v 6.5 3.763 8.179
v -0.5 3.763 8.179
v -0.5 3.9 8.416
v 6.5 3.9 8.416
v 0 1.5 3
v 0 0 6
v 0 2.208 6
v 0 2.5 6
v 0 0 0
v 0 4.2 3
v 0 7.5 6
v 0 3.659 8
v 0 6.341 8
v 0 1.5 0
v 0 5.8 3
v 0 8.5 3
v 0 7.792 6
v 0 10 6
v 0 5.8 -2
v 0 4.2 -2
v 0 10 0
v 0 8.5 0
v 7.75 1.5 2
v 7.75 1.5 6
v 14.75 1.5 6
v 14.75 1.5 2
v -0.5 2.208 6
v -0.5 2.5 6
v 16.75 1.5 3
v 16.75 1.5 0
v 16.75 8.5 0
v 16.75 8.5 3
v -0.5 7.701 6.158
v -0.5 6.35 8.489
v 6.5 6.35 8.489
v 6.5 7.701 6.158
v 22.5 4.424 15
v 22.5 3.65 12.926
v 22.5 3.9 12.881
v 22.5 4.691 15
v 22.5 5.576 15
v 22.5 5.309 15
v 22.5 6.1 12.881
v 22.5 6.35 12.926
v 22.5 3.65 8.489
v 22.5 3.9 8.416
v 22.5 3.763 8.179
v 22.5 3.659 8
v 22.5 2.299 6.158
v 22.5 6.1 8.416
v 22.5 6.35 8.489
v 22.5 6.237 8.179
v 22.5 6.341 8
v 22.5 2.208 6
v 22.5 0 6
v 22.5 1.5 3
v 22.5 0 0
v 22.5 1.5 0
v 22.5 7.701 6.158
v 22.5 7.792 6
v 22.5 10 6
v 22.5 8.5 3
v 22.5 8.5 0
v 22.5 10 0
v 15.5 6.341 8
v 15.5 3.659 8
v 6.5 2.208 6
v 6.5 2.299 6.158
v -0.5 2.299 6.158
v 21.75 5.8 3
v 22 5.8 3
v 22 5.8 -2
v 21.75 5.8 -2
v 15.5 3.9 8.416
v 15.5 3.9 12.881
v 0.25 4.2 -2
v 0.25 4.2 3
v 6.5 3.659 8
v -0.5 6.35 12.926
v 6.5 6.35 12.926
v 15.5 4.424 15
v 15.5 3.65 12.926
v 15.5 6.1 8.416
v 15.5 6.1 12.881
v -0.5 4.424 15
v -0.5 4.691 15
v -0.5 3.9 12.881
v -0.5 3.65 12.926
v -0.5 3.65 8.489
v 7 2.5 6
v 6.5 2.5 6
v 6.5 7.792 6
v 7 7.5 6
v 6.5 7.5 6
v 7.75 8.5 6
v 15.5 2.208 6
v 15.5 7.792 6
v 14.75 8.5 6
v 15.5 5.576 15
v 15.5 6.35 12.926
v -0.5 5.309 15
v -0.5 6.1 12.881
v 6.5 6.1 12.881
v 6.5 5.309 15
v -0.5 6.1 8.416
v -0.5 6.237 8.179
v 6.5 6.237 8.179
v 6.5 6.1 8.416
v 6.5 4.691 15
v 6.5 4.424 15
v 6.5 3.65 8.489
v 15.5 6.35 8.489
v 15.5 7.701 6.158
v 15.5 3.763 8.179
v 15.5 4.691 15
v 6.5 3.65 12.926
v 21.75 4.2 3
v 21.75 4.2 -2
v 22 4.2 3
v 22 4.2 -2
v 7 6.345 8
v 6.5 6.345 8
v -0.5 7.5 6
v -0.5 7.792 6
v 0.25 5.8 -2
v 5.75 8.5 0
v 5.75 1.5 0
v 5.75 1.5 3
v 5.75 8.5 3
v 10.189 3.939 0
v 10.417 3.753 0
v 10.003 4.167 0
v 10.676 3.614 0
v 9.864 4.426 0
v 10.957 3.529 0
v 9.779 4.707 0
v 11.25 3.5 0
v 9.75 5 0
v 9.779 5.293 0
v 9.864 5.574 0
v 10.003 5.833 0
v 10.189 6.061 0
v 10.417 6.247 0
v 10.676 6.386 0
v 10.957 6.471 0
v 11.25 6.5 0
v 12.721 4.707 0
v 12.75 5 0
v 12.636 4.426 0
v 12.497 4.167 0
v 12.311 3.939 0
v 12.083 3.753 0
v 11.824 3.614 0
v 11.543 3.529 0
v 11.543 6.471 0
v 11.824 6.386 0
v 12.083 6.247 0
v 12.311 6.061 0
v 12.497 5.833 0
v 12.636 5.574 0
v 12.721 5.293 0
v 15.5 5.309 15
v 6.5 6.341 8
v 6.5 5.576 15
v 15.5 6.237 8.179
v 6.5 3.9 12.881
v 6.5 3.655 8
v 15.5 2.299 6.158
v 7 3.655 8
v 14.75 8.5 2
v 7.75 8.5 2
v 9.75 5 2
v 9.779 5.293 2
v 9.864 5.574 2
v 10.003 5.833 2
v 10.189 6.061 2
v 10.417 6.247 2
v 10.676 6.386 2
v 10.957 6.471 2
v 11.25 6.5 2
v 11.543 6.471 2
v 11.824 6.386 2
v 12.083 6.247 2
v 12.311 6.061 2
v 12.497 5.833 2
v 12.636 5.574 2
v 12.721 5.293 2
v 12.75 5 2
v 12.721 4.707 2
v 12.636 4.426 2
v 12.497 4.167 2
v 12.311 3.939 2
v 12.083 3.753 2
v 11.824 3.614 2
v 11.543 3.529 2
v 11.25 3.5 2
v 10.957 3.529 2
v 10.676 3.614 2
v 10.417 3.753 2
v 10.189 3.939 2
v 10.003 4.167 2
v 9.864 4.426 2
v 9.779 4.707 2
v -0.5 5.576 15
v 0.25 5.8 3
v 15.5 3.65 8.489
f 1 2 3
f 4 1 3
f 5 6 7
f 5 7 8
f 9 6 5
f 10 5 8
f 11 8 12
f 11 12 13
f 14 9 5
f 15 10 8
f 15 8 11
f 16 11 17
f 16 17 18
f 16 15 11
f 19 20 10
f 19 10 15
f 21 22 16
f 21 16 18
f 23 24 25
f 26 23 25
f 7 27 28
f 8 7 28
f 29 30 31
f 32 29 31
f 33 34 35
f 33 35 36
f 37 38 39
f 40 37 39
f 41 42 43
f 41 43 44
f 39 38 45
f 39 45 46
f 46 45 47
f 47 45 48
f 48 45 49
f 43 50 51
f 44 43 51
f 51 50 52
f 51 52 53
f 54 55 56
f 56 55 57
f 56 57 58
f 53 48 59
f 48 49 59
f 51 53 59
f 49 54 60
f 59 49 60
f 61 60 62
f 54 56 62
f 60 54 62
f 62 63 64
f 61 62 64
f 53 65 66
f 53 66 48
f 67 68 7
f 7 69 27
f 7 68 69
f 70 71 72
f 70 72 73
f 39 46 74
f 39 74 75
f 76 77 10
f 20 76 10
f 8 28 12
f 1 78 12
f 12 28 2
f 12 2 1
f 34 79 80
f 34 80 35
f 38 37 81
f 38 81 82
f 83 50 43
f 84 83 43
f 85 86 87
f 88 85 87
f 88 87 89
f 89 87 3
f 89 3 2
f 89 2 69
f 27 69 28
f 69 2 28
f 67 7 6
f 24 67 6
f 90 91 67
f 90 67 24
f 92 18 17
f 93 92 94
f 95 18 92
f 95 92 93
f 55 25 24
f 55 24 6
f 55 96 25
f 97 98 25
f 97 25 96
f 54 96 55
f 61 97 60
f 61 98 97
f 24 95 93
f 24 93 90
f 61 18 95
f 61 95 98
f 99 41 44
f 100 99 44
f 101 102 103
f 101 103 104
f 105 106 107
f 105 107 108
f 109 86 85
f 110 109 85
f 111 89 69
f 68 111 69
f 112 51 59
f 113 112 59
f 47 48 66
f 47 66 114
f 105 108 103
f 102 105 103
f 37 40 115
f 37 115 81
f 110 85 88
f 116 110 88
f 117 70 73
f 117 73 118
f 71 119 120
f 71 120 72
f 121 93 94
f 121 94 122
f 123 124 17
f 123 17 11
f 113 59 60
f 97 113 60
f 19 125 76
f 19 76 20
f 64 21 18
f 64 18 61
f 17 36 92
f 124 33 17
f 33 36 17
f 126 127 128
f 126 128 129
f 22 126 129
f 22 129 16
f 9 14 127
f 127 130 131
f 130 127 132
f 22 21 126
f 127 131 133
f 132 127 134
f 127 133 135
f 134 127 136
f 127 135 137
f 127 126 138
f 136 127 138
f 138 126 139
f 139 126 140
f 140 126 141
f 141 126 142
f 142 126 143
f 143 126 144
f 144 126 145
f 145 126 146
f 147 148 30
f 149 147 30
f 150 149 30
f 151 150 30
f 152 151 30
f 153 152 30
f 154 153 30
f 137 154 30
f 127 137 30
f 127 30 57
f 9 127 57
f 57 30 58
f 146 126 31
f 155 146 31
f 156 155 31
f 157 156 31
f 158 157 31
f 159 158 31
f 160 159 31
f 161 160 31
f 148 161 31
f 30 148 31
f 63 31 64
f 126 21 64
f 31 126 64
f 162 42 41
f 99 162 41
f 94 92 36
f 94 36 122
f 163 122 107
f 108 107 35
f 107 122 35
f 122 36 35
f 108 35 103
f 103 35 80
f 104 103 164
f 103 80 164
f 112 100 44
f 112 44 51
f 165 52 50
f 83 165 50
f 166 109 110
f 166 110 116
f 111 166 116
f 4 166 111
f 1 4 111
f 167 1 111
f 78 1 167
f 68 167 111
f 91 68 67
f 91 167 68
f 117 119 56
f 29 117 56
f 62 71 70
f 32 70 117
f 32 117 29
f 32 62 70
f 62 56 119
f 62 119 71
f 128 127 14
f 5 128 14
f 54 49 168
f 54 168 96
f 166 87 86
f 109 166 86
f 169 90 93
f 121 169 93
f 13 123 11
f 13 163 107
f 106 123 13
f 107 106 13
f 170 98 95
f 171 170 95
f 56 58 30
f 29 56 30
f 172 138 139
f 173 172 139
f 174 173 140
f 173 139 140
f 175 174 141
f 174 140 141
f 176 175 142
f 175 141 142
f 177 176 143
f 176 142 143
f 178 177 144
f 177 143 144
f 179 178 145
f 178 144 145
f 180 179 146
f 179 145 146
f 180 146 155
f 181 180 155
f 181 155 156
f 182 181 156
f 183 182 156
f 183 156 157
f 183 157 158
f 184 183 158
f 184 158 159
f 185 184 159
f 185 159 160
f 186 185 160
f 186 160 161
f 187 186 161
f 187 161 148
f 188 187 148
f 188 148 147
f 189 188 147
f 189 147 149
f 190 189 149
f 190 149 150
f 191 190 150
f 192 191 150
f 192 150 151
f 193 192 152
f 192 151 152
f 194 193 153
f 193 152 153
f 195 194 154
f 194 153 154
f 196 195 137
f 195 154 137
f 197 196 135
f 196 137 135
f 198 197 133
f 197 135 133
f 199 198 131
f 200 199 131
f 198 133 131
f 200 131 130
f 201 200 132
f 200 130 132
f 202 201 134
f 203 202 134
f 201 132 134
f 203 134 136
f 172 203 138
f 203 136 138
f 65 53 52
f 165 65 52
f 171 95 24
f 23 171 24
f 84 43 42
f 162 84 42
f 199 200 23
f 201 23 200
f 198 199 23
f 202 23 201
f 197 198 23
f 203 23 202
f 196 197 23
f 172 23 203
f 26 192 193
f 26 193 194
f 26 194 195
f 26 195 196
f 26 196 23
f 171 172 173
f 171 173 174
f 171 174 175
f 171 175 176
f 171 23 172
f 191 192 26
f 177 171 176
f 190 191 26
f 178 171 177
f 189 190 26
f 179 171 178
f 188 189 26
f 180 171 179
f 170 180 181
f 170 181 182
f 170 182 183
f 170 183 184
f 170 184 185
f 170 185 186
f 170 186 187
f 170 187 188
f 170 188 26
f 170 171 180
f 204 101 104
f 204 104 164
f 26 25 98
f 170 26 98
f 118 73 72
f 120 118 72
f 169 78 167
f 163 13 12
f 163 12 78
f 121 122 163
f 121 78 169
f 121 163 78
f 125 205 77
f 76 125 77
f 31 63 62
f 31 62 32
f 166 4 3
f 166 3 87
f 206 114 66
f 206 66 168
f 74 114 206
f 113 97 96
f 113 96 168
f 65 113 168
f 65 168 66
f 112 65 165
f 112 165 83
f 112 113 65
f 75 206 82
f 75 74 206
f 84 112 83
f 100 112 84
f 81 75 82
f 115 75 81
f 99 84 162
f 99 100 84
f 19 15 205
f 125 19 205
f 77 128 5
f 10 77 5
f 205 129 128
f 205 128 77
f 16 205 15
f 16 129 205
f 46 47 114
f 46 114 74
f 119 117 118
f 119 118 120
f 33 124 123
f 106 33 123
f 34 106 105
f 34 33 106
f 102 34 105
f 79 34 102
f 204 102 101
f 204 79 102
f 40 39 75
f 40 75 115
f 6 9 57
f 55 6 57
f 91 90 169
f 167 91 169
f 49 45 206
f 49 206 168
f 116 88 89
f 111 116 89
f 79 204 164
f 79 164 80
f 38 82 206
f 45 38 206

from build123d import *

# Parameters (mm, degrees)
SKETCH_1_W          = 22.5
SKETCH_1_H          = 10
EXTRUDE_1_DEPTH     = 6
SKETCH_2_R          = 1.5
CUT_EXTRUDE_1_DEPTH = 26.342651795
SKETCH_3_W          = 5.75
SKETCH_3_H          = 7
CUT_EXTRUDE_2_DEPTH = 3
CUT_EXTRUDE_3_DEPTH = 4
SKETCH_5_W          = 7
SKETCH_5_H          = 5
EXTRUDE_2_DEPTH     = 2
CUT_EXTRUDE_4_DEPTH = 26.889186932
EXTRUDE_3_DEPTH     = 7
EXTRUDE_4_DEPTH     = 5


with BuildPart() as part:
    # 草图1 → 凸台-拉伸1 (new body)
    with BuildSketch(Plane.XY):
        with Locations((11.25, 5)):
            Rectangle(SKETCH_1_W, SKETCH_1_H)
    extrude(amount=EXTRUDE_1_DEPTH)

    # 草图2 → 切除-拉伸1 (cut, through all)
    with BuildSketch(Plane(origin=(0, 0, 0), x_dir=(-1, 0, 0), z_dir=(0, 0, -1))):
        with Locations((-11.25, 5)):
            Circle(SKETCH_2_R)
    extrude(amount=-CUT_EXTRUDE_1_DEPTH, mode=Mode.SUBTRACT)

    # 草图3 → 切除-拉伸2 (cut)
    with BuildSketch(Plane(origin=(0, 0, 0), x_dir=(-1, 0, 0), z_dir=(0, 0, -1))):
        with Locations((-19.625, 5)):
            Rectangle(SKETCH_3_W, SKETCH_3_H)
        with Locations((-2.875, 5)):
            Rectangle(SKETCH_3_W, SKETCH_3_H)
    extrude(amount=-CUT_EXTRUDE_2_DEPTH, mode=Mode.SUBTRACT)

    # 草图4 → 切除-拉伸3 (cut)
    with BuildSketch(Plane.XY.offset(6)):
        Polygon((14.75, 1.5), (14.75, 8.5), (11.25, 8.5), (7.75, 8.5), (7.75, 1.5), (11.25, 1.5), align=None)
    extrude(amount=-CUT_EXTRUDE_3_DEPTH, mode=Mode.SUBTRACT)

    # 草图5 → 凸台-拉伸2 (add)
    with BuildSketch(Plane.XY.offset(6)):
        with Locations((19, 5)):
            Rectangle(SKETCH_5_W, SKETCH_5_H)
        with Locations((3.5, 5)):
            Rectangle(SKETCH_5_W, SKETCH_5_H)
    extrude(amount=EXTRUDE_2_DEPTH)

    # 草图6 → 切除-拉伸4 (cut, through all)
    with BuildSketch(Plane(origin=(22.5, 0, 0), x_dir=(0, 0, -1), z_dir=(1, 0, 0))):
        Polygon((-6, 7.5), (-8, 6.345299462), (-8, 7.5), align=None)
        Polygon((-8, 3.654700538), (-8, 2.5), (-6, 2.5), align=None)
    extrude(amount=-CUT_EXTRUDE_4_DEPTH, mode=Mode.SUBTRACT)

    # 草图7 → 凸台-拉伸3 (add)
    with BuildSketch(Plane(origin=(22.5, 0, 0), x_dir=(0, 0, -1), z_dir=(1, 0, 0))):
        Polygon((-6, 7.5), (-8.178644615, 6.237293765), (-8.415528154, 6.1), (-12.880891483, 6.1), (-15, 5.308736783), (-15, 5.575596223), (-12.926043311, 6.35), (-8.488722342, 6.35), (-6.157893093, 7.700909921), (-6, 7.792422136), align=None)
        Polygon((-6, 2.5), (-8.178644615, 3.762706235), (-8.415528154, 3.9), (-12.880891483, 3.9), (-15, 4.691263217), (-15, 4.424403777), (-12.926043311, 3.65), (-8.488722342, 3.65), (-6.157893093, 2.299090079), (-6, 2.207577864), align=None)
    extrude_3 = extrude(amount=-EXTRUDE_3_DEPTH)

    # 镜向1: 凸台-拉伸3 across plane
    add(extrude_3.mirror(Plane(origin=(11, 0, 0), x_dir=(0, 0, 1), z_dir=(1, 0, 0))))

    # 草图8 → 凸台-拉伸4 (add)
    with BuildSketch(Plane(origin=(0, 0, 3), x_dir=(-1, 0, 0), z_dir=(0, 0, -1))):
        Polygon((-0.25, 5.8), (-0.25, 5), (0, 5), (0, 5.007441817), (0, 5.8), align=None)
        Polygon((0, 5), (-0.25, 5), (-0.25, 4.2), (0, 4.2), (0, 4.992558183), align=None)
    extrude_4 = extrude(amount=EXTRUDE_4_DEPTH)

    # 镜向2: 凸台-拉伸4 across plane
    add(extrude_4.mirror(Plane(origin=(11, 0, 0), x_dir=(0, 0, 1), z_dir=(1, 0, 0))))


solid = part.part
